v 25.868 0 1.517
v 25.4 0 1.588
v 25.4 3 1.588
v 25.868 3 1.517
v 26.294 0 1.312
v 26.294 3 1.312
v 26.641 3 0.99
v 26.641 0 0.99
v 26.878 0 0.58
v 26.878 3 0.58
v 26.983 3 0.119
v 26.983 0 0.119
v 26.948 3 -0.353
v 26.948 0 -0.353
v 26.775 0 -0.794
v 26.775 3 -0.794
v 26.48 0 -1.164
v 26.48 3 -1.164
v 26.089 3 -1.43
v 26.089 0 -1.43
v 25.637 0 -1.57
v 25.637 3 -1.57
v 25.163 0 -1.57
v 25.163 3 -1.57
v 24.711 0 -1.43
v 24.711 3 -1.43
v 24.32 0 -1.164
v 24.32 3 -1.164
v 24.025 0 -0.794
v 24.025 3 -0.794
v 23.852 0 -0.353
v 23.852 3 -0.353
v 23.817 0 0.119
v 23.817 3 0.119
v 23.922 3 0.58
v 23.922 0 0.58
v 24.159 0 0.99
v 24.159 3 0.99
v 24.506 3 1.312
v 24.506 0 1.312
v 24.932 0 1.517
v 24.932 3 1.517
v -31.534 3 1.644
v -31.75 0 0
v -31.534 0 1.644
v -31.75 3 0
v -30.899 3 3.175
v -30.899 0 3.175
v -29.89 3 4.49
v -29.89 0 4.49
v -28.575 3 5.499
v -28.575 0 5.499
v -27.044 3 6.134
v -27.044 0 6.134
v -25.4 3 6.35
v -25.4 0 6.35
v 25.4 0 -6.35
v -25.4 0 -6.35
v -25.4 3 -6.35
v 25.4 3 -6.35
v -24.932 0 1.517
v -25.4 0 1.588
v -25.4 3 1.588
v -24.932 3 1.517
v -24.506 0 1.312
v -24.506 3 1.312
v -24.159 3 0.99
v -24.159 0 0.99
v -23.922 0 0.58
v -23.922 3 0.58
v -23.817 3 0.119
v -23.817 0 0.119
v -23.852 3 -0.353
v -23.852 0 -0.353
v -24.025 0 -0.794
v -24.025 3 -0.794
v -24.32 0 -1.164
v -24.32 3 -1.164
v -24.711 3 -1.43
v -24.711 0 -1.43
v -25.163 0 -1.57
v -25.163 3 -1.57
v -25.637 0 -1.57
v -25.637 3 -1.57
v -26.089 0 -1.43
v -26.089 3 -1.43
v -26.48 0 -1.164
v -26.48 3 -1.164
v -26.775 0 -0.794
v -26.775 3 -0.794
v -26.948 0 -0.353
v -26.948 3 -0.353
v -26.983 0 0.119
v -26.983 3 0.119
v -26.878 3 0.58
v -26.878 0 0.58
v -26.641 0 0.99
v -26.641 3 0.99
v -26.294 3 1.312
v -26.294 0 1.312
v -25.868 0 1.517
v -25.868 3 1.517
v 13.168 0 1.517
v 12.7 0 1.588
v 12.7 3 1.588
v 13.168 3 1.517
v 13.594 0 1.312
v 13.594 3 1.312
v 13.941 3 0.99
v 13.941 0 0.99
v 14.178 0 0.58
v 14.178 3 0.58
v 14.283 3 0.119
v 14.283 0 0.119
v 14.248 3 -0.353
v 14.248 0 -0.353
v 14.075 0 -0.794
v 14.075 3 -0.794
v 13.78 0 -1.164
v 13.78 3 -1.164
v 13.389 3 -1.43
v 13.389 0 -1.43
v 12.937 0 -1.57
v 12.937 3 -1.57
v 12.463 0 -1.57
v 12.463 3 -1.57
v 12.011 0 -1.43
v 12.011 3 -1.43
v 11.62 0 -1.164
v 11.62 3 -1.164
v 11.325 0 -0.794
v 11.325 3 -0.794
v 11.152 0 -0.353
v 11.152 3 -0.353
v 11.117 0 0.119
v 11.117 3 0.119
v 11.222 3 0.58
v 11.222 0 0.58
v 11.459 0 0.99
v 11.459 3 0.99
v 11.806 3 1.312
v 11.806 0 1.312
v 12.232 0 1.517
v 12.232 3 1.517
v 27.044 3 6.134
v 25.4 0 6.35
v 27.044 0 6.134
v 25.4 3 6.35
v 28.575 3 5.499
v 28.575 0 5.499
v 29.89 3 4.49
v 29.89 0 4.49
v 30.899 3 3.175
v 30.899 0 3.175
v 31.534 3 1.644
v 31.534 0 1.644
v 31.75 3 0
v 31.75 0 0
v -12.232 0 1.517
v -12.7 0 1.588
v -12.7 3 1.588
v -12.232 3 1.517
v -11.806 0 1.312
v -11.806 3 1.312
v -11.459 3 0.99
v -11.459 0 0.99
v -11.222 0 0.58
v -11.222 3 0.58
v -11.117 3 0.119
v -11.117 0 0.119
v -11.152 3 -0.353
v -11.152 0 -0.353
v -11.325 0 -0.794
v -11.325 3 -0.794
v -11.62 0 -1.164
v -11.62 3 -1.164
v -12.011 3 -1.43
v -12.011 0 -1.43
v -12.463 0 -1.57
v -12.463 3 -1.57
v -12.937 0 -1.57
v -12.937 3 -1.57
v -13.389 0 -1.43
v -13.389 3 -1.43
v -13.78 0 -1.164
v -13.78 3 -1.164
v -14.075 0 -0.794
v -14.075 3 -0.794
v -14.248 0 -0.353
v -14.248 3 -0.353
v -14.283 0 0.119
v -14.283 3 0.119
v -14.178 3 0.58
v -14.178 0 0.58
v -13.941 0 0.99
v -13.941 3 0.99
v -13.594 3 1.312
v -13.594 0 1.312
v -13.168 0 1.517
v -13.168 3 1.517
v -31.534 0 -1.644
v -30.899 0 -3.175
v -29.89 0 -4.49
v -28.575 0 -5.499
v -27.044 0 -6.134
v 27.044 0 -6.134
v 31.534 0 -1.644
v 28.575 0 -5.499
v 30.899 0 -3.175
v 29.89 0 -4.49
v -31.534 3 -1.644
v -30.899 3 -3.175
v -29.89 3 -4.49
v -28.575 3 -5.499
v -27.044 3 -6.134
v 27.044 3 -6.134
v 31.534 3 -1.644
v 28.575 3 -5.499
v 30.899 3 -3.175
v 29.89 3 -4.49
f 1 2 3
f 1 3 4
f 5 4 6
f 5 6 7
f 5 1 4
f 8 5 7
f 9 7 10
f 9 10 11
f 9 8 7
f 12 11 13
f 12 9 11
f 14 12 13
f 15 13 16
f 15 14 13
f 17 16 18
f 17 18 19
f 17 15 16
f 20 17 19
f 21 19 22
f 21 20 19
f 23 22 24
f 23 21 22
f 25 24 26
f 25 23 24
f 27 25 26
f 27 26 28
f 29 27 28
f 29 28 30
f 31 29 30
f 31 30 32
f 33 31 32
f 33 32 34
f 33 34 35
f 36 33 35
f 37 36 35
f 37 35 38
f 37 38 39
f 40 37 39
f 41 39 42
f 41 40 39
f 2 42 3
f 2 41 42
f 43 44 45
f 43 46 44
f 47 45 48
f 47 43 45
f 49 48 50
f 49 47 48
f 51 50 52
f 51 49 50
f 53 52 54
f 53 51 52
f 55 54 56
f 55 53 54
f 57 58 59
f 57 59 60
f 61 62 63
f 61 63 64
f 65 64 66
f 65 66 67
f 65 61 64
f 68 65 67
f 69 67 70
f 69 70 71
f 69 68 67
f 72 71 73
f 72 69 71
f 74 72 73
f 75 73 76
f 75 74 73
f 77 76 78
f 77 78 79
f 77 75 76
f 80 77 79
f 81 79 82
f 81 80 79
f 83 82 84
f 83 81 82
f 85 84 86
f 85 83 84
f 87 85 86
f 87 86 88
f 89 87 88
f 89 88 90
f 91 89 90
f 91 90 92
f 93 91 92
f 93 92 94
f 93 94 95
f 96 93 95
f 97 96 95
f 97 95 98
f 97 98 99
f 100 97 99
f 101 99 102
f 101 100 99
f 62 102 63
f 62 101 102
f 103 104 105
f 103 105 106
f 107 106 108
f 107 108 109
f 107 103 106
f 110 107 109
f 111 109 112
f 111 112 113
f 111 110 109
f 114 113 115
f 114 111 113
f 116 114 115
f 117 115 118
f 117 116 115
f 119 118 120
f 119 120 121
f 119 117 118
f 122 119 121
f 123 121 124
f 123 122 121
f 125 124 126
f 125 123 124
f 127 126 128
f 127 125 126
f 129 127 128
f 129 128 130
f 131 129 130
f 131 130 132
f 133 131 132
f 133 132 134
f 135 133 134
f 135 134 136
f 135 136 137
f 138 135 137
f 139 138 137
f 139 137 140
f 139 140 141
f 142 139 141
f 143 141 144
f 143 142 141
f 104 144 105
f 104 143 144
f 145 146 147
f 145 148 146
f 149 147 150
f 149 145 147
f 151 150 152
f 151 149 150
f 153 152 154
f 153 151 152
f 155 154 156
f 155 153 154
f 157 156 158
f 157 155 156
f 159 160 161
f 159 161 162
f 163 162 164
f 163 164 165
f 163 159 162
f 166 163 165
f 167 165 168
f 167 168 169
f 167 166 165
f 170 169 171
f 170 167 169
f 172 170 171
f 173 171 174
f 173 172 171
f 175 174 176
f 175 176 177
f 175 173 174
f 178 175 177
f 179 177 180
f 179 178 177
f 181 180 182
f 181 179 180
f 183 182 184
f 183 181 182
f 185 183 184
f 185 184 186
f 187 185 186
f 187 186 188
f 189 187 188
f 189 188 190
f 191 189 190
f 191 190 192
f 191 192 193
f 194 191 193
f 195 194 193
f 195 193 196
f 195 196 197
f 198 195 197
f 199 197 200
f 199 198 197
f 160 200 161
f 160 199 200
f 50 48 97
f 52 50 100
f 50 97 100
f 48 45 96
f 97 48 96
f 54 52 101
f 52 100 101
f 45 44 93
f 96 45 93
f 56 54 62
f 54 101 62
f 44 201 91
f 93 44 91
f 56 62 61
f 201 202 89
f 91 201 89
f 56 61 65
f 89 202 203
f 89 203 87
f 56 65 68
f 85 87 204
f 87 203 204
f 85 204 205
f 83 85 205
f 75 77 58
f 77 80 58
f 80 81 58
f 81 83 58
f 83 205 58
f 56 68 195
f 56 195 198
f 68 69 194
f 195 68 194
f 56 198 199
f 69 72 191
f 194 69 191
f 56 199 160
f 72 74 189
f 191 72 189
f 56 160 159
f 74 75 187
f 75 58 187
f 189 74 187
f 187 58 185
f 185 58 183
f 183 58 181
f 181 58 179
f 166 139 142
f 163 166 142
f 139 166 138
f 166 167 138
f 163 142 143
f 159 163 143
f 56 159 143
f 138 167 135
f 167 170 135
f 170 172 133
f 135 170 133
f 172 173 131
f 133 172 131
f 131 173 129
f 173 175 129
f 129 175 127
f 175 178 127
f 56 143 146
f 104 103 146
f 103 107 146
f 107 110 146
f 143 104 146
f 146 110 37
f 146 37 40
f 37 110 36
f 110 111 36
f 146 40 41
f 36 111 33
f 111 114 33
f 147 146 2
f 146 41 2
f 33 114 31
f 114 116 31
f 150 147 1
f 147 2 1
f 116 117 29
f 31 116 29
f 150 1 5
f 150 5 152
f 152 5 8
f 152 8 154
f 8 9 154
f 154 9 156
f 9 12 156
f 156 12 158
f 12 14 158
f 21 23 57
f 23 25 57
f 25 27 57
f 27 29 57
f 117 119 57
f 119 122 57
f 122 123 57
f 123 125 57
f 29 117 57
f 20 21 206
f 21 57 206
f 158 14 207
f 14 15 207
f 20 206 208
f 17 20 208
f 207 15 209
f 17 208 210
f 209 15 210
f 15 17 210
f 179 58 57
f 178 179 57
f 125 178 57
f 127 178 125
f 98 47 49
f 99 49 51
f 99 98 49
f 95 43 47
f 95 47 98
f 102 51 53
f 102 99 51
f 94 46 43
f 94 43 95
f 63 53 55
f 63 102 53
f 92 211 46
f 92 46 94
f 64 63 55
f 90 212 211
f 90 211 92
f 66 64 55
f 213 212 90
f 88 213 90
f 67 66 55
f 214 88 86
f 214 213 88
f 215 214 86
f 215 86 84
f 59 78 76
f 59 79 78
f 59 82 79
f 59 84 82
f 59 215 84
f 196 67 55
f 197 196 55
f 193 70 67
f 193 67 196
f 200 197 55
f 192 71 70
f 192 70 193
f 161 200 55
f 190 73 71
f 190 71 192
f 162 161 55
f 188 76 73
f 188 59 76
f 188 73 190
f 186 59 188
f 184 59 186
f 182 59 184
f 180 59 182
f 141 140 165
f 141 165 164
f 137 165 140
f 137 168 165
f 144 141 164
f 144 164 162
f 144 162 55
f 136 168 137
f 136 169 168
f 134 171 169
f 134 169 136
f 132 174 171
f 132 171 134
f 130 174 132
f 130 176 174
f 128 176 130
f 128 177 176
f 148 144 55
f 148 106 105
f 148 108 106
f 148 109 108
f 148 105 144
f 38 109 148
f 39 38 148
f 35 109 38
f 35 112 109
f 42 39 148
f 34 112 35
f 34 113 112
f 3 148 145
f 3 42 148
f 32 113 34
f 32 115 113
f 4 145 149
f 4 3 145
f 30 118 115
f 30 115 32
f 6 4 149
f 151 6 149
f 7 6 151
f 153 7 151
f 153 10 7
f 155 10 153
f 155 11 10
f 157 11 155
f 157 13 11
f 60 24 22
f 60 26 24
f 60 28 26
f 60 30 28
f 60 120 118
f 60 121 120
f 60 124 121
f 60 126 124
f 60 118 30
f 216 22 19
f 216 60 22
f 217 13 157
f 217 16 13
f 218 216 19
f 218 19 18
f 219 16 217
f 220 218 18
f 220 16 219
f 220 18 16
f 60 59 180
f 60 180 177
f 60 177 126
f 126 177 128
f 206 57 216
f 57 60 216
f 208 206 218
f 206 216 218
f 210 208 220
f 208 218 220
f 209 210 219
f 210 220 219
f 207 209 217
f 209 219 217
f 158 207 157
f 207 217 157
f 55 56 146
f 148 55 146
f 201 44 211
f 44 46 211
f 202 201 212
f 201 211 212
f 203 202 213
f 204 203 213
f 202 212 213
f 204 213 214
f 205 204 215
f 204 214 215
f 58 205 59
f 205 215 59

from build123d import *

# Parameters (mm, degrees)
SKETCH1_W           = 63.5
SKETCH1_H           = 12.7
SKETCH1_R           = 1.5875
BOSS_EXTRUDE1_DEPTH = 3
FILLET1_R           = 6.35


with BuildPart() as part:
    # Sketch1 → Boss-Extrude1 (new body)
    with BuildSketch(Plane(origin=(0, 0, 0), x_dir=(1, 0, 0), z_dir=(0, 1, 0))):
        Rectangle(SKETCH1_W, SKETCH1_H)
        with Locations(Location((-12.7, 0, 0), (0, 0, 270))):
            Circle(SKETCH1_R, mode=Mode.SUBTRACT)
        with Locations(Location((12.7, 0, 0), (0, 0, 270))):
            Circle(SKETCH1_R, mode=Mode.SUBTRACT)
        with Locations(Location((25.4, 0, 0), (0, 0, 270))):
            Circle(SKETCH1_R, mode=Mode.SUBTRACT)
        with Locations(Location((-25.4, 0, 0), (0, 0, 270))):
            Circle(SKETCH1_R, mode=Mode.SUBTRACT)
    extrude(amount=BOSS_EXTRUDE1_DEPTH)

    # Fillet1
    fillet1_edges = [part.edges().sort_by_distance(p)[0] for p in [
        (-31.75, 1.5, -6.35),
        (-31.75, 1.5, 6.35),
        (31.75, 1.5, -6.35),
        (31.75, 1.5, 6.35),
    ]]
    fillet(fillet1_edges, radius=FILLET1_R - 0.0001)  # a hair under: the kernel refuses the full size


solid = part.part
